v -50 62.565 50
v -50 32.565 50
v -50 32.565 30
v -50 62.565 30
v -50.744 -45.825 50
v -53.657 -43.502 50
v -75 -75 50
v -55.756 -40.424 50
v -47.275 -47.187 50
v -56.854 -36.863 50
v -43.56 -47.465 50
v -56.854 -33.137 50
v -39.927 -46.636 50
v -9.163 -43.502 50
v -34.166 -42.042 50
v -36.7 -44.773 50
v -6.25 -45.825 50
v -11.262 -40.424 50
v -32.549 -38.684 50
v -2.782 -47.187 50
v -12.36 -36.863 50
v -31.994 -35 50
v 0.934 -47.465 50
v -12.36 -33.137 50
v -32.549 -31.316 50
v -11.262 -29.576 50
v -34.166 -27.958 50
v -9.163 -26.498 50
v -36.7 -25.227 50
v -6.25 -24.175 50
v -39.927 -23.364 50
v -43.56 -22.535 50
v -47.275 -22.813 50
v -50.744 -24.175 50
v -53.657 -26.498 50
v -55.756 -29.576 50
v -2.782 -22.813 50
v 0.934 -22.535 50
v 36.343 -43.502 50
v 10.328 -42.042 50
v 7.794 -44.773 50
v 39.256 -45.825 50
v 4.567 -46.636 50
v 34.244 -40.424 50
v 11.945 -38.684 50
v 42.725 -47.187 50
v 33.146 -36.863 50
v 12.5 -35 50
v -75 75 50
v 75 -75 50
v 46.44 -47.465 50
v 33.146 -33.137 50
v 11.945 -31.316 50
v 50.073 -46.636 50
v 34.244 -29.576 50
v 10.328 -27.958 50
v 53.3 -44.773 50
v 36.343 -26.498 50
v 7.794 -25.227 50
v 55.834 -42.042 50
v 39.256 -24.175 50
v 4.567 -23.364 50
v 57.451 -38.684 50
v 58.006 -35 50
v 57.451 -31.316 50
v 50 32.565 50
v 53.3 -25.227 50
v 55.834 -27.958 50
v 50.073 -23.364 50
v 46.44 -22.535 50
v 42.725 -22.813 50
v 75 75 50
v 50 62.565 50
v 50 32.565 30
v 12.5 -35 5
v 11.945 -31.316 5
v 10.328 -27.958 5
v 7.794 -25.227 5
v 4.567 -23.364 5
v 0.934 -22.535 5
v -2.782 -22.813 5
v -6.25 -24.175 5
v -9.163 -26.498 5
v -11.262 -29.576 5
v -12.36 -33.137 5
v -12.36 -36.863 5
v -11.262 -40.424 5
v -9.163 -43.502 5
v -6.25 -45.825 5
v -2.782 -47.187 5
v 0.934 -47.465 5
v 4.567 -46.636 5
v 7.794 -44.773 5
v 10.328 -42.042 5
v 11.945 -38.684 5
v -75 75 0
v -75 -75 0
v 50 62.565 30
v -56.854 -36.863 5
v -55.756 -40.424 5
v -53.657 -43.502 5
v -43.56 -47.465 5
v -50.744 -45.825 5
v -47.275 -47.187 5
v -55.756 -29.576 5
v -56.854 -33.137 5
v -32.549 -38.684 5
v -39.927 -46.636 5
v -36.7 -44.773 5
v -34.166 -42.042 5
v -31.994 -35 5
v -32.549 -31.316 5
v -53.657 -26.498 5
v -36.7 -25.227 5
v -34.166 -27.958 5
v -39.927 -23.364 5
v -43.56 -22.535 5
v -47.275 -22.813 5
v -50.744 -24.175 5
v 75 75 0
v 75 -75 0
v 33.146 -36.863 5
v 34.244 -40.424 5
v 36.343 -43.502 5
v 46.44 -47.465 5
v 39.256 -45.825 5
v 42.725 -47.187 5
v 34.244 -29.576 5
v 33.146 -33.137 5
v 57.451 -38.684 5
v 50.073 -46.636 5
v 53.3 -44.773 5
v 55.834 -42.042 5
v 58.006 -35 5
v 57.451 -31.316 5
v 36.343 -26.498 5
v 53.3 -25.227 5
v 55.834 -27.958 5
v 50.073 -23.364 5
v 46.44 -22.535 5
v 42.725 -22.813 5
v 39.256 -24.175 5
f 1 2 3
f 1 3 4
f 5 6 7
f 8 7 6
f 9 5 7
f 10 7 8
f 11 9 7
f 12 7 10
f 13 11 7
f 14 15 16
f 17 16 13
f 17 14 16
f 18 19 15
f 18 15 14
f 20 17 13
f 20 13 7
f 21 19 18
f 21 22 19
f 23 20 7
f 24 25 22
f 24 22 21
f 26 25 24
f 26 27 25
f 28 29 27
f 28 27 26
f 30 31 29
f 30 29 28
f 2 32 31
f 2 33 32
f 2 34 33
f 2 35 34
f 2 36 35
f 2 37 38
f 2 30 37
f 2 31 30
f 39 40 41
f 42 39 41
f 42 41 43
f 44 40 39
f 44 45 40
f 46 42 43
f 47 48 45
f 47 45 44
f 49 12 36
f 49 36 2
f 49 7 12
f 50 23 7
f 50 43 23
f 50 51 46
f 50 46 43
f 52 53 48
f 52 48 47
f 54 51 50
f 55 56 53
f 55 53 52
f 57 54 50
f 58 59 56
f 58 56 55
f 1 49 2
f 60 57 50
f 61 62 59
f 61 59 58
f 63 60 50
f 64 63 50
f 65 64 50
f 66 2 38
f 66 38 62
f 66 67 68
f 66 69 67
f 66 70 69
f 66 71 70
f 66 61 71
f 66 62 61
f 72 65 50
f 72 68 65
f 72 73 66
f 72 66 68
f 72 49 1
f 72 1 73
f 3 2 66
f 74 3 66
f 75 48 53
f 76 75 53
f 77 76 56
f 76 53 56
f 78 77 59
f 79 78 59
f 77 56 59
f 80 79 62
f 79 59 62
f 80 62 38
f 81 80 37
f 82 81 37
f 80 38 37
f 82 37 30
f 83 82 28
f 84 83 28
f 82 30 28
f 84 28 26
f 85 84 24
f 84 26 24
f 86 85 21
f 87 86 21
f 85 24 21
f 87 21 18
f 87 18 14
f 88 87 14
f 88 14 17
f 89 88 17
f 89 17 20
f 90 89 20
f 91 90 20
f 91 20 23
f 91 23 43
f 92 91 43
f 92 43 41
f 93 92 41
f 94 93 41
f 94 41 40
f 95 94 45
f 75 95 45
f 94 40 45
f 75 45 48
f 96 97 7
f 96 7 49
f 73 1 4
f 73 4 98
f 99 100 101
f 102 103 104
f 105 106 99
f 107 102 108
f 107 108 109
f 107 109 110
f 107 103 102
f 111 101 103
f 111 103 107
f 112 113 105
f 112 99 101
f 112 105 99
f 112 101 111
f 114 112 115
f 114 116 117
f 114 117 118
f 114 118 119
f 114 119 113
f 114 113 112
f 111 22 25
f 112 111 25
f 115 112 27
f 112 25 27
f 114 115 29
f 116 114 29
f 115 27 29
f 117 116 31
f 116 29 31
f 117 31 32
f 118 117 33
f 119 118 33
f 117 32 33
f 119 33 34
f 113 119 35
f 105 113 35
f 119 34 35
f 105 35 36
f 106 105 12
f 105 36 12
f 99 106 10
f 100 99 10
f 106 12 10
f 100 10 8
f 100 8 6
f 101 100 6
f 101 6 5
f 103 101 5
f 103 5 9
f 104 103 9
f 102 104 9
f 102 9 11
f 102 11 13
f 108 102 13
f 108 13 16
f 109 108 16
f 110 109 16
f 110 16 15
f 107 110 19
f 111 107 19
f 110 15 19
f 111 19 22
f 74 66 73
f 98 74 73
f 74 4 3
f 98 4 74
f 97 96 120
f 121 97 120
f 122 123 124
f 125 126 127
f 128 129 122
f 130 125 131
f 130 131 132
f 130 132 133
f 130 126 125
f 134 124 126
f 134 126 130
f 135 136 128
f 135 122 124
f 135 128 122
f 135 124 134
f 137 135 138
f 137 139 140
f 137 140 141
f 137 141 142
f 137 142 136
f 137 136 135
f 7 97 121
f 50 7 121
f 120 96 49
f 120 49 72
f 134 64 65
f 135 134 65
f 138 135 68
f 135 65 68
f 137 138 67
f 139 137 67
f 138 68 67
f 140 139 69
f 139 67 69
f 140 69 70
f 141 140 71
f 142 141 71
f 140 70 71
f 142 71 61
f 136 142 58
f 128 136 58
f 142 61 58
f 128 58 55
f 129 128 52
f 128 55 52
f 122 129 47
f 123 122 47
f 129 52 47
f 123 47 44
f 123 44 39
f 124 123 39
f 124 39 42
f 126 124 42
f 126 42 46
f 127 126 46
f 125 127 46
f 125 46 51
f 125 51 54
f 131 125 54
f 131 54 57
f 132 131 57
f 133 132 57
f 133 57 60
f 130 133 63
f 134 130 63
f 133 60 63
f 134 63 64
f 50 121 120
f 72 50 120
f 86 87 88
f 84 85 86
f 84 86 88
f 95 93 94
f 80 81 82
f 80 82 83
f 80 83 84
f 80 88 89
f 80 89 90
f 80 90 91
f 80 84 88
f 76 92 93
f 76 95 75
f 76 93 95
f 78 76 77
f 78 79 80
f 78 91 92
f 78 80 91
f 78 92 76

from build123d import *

# Parameters (mm, degrees)
ESBO_O1_W                = 150
ESBO_O1_H                = 150
RESSALTO_EXTRUS_O1_DEPTH = 50
ESBO_O2_W                = 100
ESBO_O2_H                = 30
CORTE_EXTRUS_O1_DEPTH    = 20
ESBO_O3_R                = 12.5
CORTE_EXTRUS_O2_DEPTH    = 45


with BuildPart() as part:
    # Esboço1 → Ressalto-extrusão1 (new body)
    with BuildSketch(Plane.XY):
        Rectangle(ESBO_O1_W, ESBO_O1_H)
    extrude(amount=RESSALTO_EXTRUS_O1_DEPTH)

    # Esboço2 → Corte-extrusão1 (cut)
    with BuildSketch(Plane.XY.offset(50)):
        with Locations((0, 47.564970211)):
            Rectangle(ESBO_O2_W, ESBO_O2_H)
    extrude(amount=-CORTE_EXTRUS_O1_DEPTH, mode=Mode.SUBTRACT)

    # Esboço3 → Corte-extrusão2 (cut)
    with BuildSketch(Plane.XY.offset(50)):
        with Locations((-44.493882085, -35)):
            Circle(ESBO_O3_R)
        with Locations((0, -35)):
            Circle(ESBO_O3_R)
        with Locations((45.506117915, -35)):
            Circle(ESBO_O3_R)
    extrude(amount=-CORTE_EXTRUS_O2_DEPTH, mode=Mode.SUBTRACT)


solid = part.part
